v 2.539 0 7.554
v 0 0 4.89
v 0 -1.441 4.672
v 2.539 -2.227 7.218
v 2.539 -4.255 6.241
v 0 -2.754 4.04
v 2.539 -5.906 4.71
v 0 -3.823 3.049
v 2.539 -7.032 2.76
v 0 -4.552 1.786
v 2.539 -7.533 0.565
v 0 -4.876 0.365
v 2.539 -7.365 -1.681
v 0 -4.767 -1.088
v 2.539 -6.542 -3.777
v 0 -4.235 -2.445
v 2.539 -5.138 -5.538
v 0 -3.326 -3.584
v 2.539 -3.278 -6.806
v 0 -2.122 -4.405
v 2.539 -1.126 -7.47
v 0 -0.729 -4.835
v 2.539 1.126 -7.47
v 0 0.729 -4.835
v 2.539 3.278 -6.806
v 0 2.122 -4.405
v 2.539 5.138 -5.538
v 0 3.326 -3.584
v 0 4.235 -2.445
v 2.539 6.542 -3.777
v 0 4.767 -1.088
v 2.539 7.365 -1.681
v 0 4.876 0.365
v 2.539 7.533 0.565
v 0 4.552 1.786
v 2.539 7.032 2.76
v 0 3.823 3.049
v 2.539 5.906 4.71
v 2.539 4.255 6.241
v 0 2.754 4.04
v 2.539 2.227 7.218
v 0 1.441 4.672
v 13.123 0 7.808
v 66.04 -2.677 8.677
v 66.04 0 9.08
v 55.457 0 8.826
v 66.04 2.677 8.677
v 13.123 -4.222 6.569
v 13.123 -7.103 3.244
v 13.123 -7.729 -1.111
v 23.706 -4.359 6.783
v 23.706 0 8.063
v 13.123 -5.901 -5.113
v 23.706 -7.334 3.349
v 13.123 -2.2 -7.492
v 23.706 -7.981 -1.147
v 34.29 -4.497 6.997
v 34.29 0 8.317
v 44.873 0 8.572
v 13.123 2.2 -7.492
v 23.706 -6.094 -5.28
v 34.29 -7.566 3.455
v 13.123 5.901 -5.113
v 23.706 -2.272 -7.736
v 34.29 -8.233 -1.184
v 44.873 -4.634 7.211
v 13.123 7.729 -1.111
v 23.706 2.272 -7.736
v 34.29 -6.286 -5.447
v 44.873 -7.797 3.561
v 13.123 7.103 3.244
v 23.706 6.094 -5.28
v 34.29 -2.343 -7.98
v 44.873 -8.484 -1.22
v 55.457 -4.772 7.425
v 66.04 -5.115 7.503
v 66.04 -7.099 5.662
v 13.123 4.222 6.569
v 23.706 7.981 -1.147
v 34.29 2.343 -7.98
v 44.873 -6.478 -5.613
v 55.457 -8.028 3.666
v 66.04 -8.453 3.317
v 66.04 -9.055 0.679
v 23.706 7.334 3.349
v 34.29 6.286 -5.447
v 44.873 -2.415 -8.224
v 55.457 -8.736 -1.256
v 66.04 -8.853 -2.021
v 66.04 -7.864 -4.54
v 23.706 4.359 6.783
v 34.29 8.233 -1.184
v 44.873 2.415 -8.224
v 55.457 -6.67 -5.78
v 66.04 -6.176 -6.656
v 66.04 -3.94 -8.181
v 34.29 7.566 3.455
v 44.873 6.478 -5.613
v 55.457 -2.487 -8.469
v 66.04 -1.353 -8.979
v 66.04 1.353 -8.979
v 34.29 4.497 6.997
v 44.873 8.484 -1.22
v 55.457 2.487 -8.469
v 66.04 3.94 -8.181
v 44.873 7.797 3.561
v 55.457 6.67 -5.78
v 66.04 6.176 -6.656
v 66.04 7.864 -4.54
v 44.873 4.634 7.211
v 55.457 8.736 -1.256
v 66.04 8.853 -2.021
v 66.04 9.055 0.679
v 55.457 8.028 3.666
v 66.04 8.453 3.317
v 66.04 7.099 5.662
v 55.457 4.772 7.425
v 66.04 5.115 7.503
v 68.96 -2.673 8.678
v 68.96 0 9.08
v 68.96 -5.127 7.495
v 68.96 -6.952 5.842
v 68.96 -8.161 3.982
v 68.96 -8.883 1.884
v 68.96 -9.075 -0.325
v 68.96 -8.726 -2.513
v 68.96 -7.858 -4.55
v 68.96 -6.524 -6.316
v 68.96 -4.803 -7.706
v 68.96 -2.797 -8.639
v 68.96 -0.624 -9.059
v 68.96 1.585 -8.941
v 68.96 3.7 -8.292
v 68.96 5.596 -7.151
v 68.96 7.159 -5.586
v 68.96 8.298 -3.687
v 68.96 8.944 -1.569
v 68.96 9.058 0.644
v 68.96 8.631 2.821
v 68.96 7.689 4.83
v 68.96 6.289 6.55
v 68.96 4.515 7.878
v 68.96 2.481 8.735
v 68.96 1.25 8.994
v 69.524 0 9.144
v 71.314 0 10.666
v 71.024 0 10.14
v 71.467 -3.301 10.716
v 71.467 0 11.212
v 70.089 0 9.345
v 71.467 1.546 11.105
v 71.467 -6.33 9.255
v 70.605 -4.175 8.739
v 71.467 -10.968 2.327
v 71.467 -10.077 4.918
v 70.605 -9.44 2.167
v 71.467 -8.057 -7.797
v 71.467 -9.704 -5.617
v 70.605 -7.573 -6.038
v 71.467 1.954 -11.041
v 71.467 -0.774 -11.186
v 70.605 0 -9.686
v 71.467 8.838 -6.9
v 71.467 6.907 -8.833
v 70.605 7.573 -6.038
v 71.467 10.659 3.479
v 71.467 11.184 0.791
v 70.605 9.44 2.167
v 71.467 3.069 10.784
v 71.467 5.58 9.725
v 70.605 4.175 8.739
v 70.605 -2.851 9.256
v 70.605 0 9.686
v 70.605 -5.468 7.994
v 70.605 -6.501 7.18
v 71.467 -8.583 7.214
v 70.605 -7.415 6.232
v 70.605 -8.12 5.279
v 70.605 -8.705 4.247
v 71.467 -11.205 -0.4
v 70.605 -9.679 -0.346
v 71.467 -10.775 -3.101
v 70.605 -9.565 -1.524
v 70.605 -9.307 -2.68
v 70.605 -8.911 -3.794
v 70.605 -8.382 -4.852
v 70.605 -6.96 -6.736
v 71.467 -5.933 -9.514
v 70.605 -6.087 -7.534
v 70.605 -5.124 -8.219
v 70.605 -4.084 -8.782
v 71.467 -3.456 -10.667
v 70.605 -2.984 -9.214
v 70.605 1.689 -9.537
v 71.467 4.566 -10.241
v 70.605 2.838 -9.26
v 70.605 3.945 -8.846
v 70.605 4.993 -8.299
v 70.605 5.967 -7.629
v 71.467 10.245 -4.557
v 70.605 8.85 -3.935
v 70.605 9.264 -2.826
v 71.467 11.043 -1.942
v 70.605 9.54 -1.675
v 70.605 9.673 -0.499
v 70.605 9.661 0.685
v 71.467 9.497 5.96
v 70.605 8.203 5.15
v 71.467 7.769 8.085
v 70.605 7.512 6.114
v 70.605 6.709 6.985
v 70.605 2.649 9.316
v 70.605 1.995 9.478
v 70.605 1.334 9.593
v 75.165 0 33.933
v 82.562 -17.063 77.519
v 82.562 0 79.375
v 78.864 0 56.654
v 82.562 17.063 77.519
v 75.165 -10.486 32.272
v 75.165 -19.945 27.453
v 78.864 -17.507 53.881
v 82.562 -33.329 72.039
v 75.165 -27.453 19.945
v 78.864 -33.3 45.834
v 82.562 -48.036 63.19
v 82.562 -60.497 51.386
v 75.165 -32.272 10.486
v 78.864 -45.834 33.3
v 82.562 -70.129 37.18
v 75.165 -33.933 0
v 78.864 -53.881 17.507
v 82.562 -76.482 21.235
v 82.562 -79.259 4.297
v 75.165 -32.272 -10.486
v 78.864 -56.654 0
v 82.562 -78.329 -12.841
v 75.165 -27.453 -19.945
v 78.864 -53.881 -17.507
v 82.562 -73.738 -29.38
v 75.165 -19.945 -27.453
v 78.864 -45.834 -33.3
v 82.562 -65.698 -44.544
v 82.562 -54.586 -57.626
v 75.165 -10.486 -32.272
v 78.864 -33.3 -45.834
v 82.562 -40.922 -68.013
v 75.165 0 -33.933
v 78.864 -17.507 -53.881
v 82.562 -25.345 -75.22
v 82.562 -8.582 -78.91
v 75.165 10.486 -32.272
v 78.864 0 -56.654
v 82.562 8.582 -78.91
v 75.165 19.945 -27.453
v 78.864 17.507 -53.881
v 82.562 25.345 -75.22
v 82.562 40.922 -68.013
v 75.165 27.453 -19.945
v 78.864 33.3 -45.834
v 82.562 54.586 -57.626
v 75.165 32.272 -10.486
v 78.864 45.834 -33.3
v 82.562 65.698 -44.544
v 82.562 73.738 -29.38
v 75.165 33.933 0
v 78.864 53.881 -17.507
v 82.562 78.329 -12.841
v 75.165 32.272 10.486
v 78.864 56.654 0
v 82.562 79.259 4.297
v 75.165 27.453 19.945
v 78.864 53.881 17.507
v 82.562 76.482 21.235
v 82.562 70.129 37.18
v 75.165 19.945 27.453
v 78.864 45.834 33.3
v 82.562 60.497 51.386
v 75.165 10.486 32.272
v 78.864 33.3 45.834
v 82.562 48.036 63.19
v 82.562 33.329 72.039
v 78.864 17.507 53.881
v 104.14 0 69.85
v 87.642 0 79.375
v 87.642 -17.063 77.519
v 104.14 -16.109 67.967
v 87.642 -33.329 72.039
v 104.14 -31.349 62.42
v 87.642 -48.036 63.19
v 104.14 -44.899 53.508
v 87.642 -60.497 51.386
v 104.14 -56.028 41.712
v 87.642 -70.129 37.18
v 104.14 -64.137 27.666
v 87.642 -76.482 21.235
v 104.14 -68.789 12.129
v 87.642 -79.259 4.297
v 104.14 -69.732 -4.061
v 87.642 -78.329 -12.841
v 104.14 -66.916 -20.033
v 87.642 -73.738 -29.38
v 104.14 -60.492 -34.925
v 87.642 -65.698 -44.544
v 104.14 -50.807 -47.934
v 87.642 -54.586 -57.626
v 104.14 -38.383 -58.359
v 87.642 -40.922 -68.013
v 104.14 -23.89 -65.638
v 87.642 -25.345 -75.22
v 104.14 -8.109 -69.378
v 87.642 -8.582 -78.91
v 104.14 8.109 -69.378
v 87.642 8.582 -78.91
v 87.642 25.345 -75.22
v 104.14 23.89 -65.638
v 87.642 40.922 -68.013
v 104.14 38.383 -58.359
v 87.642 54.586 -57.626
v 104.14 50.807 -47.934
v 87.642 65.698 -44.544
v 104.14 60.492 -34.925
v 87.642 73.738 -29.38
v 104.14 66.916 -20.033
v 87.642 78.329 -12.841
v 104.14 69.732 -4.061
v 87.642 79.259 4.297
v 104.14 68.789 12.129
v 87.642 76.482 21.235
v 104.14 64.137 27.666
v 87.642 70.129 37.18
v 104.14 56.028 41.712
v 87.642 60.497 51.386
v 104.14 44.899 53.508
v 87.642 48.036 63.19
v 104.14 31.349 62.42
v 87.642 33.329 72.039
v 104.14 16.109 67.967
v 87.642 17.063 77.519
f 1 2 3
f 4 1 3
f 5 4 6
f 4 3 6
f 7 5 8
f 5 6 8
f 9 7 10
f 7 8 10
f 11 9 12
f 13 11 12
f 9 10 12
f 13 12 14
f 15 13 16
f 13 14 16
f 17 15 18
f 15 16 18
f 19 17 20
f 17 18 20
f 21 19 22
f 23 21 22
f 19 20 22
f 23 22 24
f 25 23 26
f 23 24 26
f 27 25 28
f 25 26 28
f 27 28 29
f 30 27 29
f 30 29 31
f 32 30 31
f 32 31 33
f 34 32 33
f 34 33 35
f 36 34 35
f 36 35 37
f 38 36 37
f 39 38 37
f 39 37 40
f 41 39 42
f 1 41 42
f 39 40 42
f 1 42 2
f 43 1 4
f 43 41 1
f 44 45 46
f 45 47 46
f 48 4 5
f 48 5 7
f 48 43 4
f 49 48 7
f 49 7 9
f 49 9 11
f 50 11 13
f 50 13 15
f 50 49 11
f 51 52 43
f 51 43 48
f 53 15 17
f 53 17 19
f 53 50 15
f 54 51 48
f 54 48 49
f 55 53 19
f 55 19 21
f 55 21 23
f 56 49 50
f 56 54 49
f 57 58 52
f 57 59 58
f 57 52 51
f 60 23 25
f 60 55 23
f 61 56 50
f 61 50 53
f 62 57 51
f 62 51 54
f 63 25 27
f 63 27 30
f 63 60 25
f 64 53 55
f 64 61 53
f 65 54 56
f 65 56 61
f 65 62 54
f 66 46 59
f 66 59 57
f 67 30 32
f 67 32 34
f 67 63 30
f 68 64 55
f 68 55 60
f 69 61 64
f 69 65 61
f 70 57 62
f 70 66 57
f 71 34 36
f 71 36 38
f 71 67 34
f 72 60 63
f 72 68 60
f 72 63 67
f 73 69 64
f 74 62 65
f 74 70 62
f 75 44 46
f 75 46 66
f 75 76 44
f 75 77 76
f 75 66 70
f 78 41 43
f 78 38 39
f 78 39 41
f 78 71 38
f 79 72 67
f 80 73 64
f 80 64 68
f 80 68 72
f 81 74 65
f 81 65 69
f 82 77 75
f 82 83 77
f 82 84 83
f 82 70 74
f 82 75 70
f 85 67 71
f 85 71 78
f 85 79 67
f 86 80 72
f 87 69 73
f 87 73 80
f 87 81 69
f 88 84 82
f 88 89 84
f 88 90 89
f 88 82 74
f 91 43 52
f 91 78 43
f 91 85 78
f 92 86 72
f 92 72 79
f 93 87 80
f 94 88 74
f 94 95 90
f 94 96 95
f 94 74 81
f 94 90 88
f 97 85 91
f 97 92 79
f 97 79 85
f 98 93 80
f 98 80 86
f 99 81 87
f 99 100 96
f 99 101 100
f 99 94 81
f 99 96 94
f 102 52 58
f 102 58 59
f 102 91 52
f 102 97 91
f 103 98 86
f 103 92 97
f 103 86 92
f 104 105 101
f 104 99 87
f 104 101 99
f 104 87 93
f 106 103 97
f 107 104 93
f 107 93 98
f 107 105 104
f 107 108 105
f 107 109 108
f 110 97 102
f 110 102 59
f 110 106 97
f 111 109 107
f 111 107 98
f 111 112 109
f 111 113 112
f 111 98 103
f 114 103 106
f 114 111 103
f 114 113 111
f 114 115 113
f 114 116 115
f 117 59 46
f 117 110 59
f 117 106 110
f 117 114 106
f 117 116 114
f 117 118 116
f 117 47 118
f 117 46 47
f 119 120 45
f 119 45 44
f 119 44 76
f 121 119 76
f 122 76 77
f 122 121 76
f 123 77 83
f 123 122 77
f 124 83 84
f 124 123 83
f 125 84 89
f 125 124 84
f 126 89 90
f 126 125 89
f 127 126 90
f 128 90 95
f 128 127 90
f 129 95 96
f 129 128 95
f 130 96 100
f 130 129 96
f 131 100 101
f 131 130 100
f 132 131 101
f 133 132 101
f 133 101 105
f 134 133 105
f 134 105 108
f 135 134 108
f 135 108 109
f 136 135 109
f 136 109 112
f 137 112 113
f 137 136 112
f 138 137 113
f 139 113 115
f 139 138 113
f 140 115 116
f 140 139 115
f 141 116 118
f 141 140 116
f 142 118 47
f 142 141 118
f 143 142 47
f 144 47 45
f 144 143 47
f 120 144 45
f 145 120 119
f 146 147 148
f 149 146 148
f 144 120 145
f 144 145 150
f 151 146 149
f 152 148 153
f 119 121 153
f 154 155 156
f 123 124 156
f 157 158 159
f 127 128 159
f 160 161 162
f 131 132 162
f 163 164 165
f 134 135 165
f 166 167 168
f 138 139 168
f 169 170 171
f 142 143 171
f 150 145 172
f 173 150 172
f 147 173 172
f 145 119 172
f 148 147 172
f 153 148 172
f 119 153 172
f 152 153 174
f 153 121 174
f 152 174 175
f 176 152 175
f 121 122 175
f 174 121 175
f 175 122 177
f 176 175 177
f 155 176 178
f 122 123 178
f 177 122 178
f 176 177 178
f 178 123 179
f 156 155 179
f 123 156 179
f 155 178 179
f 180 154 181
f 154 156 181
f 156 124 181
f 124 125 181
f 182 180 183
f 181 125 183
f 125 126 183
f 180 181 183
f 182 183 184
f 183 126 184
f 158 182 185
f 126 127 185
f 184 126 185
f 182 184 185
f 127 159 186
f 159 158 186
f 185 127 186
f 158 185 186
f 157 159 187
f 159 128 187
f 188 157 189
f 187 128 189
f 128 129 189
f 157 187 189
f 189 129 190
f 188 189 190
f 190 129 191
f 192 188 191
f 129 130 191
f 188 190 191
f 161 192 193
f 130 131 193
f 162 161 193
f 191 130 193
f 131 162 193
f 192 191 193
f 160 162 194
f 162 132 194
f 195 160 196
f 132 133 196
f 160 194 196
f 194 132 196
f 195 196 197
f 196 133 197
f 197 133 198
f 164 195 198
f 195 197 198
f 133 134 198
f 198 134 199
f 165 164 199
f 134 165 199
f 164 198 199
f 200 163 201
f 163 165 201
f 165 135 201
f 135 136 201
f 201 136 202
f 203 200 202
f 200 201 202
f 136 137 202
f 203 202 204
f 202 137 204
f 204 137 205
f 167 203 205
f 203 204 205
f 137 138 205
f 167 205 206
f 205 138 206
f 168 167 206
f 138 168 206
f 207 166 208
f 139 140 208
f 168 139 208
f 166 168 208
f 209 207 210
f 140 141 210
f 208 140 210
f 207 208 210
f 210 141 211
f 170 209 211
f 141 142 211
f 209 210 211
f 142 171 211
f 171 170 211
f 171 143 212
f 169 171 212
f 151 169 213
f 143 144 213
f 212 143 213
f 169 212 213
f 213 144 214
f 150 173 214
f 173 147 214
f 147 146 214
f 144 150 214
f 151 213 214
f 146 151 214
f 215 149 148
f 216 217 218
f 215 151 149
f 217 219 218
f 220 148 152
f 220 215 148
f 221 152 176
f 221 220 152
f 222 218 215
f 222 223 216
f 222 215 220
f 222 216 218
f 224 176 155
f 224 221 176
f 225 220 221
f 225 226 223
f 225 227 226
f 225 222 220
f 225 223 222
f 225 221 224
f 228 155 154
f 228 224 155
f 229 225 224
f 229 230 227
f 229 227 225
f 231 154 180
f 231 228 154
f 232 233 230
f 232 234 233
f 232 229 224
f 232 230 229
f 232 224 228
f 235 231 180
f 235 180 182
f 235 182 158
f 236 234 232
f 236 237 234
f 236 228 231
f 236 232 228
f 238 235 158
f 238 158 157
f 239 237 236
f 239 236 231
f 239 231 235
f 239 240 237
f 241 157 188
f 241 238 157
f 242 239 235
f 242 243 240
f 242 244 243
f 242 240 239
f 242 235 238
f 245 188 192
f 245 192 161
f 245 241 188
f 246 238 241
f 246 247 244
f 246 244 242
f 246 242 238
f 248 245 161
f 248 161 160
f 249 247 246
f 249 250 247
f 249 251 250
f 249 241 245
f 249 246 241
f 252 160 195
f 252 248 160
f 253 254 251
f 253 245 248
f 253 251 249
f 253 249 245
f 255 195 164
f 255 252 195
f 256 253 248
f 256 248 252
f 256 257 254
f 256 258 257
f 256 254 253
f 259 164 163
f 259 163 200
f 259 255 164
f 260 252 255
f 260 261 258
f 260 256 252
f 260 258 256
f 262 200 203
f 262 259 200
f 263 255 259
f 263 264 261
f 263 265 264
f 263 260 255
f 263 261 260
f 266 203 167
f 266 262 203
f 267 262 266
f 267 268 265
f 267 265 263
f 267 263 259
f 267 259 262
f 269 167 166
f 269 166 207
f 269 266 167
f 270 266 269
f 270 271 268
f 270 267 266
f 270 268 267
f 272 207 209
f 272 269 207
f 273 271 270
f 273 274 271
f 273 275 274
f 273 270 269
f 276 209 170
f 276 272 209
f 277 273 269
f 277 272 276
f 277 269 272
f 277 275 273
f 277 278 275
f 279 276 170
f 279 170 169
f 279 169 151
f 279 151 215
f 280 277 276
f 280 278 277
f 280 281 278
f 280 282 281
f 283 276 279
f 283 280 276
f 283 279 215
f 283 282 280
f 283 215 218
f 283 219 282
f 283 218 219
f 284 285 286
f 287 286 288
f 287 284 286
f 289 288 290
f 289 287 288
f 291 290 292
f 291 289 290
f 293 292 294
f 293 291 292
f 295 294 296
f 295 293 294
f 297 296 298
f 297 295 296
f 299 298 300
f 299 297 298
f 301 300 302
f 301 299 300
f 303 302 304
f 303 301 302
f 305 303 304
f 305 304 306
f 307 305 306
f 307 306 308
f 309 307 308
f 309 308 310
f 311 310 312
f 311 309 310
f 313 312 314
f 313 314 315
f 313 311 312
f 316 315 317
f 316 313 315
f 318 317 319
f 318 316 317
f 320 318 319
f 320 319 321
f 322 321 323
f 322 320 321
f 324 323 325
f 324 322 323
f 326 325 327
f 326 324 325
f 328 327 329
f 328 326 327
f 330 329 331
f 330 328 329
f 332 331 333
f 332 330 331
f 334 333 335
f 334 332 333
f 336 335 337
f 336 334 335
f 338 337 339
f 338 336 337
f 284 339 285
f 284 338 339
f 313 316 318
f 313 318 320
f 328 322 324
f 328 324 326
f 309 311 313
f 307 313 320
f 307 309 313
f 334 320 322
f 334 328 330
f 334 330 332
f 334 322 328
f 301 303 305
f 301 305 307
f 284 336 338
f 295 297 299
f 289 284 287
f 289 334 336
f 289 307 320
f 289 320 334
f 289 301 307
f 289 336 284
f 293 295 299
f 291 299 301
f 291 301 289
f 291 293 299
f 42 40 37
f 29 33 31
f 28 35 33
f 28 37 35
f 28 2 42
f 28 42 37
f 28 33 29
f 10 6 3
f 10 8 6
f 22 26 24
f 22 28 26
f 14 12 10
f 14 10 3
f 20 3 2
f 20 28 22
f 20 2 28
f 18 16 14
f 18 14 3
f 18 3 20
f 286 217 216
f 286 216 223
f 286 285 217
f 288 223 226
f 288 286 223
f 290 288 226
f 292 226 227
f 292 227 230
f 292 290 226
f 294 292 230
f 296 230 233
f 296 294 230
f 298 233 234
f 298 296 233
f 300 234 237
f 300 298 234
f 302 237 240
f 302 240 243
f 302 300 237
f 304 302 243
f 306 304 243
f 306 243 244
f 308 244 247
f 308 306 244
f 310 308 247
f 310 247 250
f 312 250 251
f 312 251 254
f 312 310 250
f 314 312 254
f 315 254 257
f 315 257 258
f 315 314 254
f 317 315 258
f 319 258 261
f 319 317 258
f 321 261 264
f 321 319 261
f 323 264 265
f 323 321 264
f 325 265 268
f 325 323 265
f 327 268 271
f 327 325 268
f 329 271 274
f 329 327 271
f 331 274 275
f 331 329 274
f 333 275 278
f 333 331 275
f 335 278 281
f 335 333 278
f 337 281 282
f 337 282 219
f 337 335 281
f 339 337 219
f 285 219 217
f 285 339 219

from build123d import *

# Parameters (mm, degrees)
FILLET1_R      = 2.54
CHAMFER1_SIZE  = 2.54
CHAMFER1_SIZE2 = 2.60331341


with BuildPart() as part:
    # Sketch1 → Revolve1 (revolve)
    with BuildSketch(Plane.XY, mode=Mode.PRIVATE) as revolve1_sk:
        Polygon((0, 0), (0, 7.493), (66.04, 9.0805), (71.12, 9.0805), (82.562216058, 79.375), (87.642216058, 79.375), (104.14, 69.85), (104.14, 0), align=None)
    revolve(revolve1_sk.sketch.rotate(Axis((-13.738402674, 0, 0), (1, 0, 0)), 90), axis=Axis((-13.738402674, 0, 0), (1, 0, 0)))

    # Fillet1
    fillet1_edges = [part.edges().sort_by_distance(p)[0] for p in [
        (71.12, 0, -9.0805),
    ]]
    fillet(fillet1_edges, radius=FILLET1_R)

    # Chamfer1
    chamfer1_edges = [part.edges().sort_by_distance(p)[0] for p in [
        (0, 0, -7.493),
    ]]
    chamfer1_side = [part.faces().sort_by_distance(p)[0] for p in [
        (33.02, 0, -8.28675),
    ]]
    chamfer(chamfer1_edges, length=CHAMFER1_SIZE, length2=CHAMFER1_SIZE2, reference=chamfer1_side[0])


solid = part.part
